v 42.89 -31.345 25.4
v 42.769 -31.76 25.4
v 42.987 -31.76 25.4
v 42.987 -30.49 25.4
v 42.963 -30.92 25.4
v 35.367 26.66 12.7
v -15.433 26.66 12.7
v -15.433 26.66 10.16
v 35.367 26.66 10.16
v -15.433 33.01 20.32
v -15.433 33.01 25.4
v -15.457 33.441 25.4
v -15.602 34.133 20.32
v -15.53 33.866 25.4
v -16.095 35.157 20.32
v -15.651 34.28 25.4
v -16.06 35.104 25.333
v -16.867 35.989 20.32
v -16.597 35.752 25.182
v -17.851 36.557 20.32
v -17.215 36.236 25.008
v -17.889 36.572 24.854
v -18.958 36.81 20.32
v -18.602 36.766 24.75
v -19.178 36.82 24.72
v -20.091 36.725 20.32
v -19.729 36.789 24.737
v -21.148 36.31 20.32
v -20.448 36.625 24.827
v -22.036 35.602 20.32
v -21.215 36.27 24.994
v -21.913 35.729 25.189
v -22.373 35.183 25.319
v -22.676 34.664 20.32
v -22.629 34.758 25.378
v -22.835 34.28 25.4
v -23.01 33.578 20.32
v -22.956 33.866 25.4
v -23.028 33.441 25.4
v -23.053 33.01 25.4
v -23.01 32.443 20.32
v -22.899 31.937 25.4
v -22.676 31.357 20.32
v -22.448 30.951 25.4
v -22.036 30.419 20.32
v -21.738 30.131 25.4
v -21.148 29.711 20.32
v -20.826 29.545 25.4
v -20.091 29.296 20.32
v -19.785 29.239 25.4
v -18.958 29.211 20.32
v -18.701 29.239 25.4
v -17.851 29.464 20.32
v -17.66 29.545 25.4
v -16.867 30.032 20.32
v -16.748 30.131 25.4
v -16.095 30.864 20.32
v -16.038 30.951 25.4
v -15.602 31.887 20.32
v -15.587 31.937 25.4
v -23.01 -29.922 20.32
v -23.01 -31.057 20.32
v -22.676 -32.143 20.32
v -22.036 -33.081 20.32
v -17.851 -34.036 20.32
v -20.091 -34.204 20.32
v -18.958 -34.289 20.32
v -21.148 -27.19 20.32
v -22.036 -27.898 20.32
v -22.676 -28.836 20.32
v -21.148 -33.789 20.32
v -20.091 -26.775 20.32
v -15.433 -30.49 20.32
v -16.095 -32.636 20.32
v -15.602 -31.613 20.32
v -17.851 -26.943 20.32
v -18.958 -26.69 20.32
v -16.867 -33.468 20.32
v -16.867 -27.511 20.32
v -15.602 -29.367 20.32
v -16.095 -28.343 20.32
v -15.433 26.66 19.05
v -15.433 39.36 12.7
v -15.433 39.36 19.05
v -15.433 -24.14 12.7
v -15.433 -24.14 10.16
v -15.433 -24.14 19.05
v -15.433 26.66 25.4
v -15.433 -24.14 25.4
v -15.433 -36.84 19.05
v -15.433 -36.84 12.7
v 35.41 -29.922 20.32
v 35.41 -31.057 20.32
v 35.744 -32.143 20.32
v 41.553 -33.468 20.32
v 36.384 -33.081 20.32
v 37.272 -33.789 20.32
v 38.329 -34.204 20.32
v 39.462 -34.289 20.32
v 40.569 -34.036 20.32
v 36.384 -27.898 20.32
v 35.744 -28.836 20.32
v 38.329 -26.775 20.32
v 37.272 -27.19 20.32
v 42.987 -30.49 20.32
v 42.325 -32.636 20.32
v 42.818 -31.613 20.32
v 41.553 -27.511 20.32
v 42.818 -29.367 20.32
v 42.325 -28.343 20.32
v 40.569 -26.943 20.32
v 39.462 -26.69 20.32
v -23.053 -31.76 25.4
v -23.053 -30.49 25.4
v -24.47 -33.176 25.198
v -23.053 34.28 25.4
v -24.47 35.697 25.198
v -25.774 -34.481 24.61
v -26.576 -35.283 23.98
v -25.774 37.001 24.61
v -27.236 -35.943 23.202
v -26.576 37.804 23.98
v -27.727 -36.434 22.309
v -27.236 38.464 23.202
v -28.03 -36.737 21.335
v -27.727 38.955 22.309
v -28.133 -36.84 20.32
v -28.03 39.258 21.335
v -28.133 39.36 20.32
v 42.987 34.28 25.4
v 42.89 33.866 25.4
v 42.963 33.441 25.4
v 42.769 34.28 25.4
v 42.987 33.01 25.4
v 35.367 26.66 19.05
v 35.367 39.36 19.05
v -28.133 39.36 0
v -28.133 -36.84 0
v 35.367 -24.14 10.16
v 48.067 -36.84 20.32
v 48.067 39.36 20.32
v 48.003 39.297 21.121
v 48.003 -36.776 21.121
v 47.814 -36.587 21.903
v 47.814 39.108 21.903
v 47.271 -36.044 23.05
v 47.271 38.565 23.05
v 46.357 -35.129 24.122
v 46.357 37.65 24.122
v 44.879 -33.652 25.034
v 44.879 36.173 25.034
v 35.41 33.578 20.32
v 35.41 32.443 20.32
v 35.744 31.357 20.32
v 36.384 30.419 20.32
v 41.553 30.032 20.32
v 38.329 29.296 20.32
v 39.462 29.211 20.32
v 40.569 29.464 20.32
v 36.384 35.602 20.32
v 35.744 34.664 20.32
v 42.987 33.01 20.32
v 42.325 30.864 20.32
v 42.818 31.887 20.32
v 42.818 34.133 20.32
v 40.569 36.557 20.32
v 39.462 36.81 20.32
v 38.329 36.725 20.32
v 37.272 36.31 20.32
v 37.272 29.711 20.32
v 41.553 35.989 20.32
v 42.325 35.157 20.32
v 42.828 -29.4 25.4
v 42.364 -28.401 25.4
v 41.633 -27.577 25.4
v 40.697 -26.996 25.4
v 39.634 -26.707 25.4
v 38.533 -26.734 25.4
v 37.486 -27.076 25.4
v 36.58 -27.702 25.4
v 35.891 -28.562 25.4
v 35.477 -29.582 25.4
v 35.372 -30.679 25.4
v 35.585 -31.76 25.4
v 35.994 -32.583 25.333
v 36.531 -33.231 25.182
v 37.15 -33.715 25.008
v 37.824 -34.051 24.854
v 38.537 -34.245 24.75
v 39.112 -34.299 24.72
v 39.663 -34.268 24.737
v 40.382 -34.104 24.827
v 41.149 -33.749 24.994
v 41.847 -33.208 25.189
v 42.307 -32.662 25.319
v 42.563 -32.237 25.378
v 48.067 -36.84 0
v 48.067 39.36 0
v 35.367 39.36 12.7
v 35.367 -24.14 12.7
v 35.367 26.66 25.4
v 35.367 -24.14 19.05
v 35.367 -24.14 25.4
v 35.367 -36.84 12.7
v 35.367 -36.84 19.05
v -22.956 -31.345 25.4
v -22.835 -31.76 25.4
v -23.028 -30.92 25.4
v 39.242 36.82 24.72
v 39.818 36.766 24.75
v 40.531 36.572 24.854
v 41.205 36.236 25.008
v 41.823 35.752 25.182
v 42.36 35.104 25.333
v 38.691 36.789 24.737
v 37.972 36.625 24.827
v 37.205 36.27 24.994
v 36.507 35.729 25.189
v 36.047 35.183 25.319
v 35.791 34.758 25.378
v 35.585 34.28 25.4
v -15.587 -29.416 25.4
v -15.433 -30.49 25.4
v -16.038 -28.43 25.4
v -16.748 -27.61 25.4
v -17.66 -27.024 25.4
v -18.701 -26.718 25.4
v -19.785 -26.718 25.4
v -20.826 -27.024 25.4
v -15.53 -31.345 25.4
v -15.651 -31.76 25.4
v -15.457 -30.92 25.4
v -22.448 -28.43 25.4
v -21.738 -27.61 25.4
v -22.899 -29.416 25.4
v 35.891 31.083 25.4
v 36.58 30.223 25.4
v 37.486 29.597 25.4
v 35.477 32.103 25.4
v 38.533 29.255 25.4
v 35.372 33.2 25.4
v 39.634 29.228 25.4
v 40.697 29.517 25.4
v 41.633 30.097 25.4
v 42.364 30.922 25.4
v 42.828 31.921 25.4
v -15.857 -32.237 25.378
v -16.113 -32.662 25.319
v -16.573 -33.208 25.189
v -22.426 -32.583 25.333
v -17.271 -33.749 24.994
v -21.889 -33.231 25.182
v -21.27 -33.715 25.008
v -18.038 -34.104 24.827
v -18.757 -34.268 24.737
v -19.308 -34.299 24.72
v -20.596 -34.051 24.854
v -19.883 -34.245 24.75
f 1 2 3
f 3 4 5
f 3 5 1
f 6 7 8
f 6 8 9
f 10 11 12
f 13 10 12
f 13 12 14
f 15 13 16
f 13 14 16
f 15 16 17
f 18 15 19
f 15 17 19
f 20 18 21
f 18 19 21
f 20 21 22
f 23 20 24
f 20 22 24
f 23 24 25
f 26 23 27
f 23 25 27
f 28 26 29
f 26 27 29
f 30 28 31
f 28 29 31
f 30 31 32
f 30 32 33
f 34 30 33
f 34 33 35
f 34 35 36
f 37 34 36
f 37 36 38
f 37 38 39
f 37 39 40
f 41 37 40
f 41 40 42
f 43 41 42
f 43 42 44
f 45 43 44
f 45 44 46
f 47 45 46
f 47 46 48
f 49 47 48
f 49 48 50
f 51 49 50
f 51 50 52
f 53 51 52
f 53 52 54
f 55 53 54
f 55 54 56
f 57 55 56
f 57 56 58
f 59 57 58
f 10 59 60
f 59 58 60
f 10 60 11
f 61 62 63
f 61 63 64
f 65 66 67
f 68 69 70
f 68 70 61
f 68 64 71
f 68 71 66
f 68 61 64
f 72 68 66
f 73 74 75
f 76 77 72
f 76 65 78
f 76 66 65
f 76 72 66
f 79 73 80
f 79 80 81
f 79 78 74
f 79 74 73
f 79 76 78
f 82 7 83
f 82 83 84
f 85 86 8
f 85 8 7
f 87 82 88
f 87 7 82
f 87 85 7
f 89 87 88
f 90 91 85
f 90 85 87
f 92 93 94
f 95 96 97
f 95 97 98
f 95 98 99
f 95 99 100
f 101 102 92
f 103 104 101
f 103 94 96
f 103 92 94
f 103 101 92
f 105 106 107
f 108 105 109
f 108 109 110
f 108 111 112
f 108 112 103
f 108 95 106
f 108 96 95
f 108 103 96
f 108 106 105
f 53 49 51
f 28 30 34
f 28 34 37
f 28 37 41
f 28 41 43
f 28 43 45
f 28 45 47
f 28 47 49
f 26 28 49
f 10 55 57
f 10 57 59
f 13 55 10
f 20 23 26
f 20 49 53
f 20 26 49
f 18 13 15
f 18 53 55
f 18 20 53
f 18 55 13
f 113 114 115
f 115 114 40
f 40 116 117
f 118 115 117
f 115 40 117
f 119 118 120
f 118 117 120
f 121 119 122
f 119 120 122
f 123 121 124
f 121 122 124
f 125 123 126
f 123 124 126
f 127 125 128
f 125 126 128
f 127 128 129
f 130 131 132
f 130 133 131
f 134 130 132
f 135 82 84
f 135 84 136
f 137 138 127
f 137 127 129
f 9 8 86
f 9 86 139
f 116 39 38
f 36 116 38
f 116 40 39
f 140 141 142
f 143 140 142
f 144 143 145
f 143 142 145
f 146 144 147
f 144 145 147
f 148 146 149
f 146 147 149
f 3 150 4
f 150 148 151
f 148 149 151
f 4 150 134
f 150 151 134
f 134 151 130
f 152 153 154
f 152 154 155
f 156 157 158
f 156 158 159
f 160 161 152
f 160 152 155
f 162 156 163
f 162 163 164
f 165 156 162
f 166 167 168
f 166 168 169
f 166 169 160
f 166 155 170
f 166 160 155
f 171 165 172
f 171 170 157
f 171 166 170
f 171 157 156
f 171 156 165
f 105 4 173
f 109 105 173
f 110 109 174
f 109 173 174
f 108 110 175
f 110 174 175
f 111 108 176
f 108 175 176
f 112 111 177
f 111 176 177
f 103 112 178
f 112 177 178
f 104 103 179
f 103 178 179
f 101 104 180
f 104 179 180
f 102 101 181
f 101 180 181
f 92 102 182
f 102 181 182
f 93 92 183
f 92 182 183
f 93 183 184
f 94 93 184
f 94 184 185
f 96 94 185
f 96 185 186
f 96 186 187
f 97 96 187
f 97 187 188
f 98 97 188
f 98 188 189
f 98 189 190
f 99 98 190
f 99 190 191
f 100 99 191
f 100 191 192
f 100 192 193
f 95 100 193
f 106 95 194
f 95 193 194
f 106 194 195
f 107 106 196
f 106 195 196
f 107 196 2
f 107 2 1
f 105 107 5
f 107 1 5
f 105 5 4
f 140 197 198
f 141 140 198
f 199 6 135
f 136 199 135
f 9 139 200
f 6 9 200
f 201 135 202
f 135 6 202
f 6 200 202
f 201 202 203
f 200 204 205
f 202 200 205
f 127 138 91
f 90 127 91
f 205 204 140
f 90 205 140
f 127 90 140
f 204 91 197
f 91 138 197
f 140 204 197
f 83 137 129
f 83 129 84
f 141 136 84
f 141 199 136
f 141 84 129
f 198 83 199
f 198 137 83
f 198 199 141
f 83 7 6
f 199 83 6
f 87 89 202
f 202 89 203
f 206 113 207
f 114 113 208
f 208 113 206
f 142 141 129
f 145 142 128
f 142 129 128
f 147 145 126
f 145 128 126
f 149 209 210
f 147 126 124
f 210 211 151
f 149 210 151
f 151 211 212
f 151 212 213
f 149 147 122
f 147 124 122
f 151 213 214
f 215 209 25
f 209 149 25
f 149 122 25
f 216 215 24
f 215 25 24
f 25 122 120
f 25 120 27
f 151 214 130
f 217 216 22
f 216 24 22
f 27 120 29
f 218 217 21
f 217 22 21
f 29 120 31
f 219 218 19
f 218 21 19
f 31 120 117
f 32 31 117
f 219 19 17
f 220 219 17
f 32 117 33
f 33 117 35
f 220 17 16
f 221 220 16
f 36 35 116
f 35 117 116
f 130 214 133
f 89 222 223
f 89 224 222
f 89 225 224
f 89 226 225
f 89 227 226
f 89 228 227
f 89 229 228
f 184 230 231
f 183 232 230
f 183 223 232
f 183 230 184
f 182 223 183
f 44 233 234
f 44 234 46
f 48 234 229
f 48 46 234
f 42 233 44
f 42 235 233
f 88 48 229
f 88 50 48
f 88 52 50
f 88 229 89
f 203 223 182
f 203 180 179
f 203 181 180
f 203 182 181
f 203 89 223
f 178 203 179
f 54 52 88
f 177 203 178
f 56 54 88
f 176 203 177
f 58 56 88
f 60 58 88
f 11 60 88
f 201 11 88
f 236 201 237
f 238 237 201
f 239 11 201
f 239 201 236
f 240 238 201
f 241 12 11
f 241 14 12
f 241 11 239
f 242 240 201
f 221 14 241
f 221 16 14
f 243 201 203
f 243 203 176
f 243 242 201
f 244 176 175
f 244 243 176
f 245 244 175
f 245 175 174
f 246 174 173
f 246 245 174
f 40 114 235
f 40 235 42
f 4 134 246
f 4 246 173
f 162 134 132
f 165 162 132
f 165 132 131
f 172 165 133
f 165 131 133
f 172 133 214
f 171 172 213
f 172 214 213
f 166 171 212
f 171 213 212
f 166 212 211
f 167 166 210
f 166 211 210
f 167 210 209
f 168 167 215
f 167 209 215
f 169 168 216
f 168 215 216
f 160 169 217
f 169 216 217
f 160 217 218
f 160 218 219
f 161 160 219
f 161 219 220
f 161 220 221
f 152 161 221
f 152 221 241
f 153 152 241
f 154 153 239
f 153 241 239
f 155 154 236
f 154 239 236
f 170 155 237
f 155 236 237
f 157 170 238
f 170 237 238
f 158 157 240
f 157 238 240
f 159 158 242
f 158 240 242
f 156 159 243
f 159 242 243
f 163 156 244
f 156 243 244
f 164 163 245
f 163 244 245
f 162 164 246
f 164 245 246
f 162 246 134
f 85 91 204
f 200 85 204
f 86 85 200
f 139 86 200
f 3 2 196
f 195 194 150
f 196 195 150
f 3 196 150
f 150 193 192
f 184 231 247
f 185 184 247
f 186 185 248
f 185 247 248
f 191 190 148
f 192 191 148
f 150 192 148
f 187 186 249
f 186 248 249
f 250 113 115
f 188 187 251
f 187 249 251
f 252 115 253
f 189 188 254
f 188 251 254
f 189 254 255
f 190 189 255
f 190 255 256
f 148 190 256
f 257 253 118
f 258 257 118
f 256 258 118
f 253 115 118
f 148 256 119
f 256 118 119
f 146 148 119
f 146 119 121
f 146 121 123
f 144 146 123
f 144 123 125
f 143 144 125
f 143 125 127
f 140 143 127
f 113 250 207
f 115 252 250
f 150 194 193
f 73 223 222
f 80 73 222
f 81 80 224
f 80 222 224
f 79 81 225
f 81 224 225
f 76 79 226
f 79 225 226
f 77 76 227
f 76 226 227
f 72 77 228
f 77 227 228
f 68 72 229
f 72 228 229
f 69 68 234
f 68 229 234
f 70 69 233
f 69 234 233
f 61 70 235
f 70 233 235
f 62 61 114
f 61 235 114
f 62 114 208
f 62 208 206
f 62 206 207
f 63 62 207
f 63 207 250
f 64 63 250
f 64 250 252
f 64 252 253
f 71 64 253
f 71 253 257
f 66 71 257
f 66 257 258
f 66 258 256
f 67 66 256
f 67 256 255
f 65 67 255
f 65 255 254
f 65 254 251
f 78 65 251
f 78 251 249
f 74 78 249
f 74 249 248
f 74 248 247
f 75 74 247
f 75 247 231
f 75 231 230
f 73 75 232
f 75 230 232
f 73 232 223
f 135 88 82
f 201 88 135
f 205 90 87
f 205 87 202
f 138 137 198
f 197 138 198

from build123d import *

# Parameters (mm, degrees)
F0_W        = 76.2
F0_H        = 76.2
F1_DEPTH    = 25.4
F2_W        = 50.8
F2_H        = 6.35
F3_DEPTH    = 76.201
F4_W        = 50.8
F4_H        = 50.8
F5_DEPTH    = 15.24
F6_R        = 3.81
F7_DEPTH    = 5.08
F8_T1_DEPTH = 101.6
F8_T3_DEPTH = 101.6


# Not quite as in the source:
# - a fillet or chamfer that OpenCascade refuses, or shapes differently, is made with other operations: its cross-section is extruded or revolved along the edge and cut away or added


with BuildPart() as f1:
    # F0 (on Top) → F1 (new body)
    with BuildSketch(Plane.XY):
        with Locations((9.967116639, 1.2604303423)):
            Rectangle(F0_W, F0_H)
    extrude(amount=F1_DEPTH)

    # F2 (on face) → F3 (cut, through all)
    with BuildSketch(Plane.XZ.offset(36.8395696577)):
        with Locations((9.967116639, 15.875)):
            Rectangle(F2_W, F2_H)
    extrude(amount=-F3_DEPTH, mode=Mode.SUBTRACT)

    # F4 (on face) → F5 (cut)
    with BuildSketch(Plane.XY.offset(25.4)):
        with Locations((9.967116639, 1.2604303423)):
            Rectangle(F4_W, F4_H)
    extrude(amount=-F5_DEPTH, mode=Mode.SUBTRACT)

    # F6 (on face) → F7 (cut)
    with BuildSketch(Plane.XY.offset(25.4)):
        with Locations((-19.242883361, 33.0104303423)):
            Circle(F6_R)
        with Locations((39.177116639, 33.0104303423)):
            Circle(F6_R)
        with Locations((-19.242883361, -30.4895696577)):
            Circle(F6_R)
        with Locations((39.177116639, -30.4895696577)):
            Circle(F6_R)
    extrude(amount=-F7_DEPTH, mode=Mode.SUBTRACT)

    # F8: fillet of radius 5.08 on 4 edges, made by hand

    # F8_s2 → F8_t1 (cut)
    with BuildSketch(Plane.XZ.offset(-52.0604303423)):
        with BuildLine():
            ThreePointArc((48.067116639, 20.32), (46.5792190874, 23.9121024484), (42.987116639, 25.4))
            Line((42.987116639, 25.4), (48.067116639, 25.4))
            Line((48.067116639, 25.4), (48.067116639, 20.32))
        make_face()
        with BuildLine():
            ThreePointArc((-23.052883361, 25.4), (-26.6449858094, 23.9121024484), (-28.132883361, 20.32))
            Line((-28.132883361, 20.32), (-28.132883361, 25.4))
            Line((-28.132883361, 25.4), (-23.052883361, 25.4))
        make_face()
    extrude(amount=F8_T1_DEPTH, mode=Mode.SUBTRACT)

    # F8_s4 → F8_t3 (cut)
    with BuildSketch(Plane.YZ.offset(-40.832883361)):
        with BuildLine():
            ThreePointArc((-31.7595696577, 25.4), (-35.3516721061, 23.9121024484), (-36.8395696577, 20.32))
            Line((-36.8395696577, 20.32), (-36.8395696577, 25.4))
            Line((-36.8395696577, 25.4), (-31.7595696577, 25.4))
        make_face()
        with BuildLine():
            ThreePointArc((39.3604303423, 20.32), (37.8725327907, 23.9121024484), (34.2804303423, 25.4))
            Line((34.2804303423, 25.4), (39.3604303423, 25.4))
            Line((39.3604303423, 25.4), (39.3604303423, 20.32))
        make_face()
    extrude(amount=F8_T3_DEPTH, mode=Mode.SUBTRACT)


solid = f1.part
